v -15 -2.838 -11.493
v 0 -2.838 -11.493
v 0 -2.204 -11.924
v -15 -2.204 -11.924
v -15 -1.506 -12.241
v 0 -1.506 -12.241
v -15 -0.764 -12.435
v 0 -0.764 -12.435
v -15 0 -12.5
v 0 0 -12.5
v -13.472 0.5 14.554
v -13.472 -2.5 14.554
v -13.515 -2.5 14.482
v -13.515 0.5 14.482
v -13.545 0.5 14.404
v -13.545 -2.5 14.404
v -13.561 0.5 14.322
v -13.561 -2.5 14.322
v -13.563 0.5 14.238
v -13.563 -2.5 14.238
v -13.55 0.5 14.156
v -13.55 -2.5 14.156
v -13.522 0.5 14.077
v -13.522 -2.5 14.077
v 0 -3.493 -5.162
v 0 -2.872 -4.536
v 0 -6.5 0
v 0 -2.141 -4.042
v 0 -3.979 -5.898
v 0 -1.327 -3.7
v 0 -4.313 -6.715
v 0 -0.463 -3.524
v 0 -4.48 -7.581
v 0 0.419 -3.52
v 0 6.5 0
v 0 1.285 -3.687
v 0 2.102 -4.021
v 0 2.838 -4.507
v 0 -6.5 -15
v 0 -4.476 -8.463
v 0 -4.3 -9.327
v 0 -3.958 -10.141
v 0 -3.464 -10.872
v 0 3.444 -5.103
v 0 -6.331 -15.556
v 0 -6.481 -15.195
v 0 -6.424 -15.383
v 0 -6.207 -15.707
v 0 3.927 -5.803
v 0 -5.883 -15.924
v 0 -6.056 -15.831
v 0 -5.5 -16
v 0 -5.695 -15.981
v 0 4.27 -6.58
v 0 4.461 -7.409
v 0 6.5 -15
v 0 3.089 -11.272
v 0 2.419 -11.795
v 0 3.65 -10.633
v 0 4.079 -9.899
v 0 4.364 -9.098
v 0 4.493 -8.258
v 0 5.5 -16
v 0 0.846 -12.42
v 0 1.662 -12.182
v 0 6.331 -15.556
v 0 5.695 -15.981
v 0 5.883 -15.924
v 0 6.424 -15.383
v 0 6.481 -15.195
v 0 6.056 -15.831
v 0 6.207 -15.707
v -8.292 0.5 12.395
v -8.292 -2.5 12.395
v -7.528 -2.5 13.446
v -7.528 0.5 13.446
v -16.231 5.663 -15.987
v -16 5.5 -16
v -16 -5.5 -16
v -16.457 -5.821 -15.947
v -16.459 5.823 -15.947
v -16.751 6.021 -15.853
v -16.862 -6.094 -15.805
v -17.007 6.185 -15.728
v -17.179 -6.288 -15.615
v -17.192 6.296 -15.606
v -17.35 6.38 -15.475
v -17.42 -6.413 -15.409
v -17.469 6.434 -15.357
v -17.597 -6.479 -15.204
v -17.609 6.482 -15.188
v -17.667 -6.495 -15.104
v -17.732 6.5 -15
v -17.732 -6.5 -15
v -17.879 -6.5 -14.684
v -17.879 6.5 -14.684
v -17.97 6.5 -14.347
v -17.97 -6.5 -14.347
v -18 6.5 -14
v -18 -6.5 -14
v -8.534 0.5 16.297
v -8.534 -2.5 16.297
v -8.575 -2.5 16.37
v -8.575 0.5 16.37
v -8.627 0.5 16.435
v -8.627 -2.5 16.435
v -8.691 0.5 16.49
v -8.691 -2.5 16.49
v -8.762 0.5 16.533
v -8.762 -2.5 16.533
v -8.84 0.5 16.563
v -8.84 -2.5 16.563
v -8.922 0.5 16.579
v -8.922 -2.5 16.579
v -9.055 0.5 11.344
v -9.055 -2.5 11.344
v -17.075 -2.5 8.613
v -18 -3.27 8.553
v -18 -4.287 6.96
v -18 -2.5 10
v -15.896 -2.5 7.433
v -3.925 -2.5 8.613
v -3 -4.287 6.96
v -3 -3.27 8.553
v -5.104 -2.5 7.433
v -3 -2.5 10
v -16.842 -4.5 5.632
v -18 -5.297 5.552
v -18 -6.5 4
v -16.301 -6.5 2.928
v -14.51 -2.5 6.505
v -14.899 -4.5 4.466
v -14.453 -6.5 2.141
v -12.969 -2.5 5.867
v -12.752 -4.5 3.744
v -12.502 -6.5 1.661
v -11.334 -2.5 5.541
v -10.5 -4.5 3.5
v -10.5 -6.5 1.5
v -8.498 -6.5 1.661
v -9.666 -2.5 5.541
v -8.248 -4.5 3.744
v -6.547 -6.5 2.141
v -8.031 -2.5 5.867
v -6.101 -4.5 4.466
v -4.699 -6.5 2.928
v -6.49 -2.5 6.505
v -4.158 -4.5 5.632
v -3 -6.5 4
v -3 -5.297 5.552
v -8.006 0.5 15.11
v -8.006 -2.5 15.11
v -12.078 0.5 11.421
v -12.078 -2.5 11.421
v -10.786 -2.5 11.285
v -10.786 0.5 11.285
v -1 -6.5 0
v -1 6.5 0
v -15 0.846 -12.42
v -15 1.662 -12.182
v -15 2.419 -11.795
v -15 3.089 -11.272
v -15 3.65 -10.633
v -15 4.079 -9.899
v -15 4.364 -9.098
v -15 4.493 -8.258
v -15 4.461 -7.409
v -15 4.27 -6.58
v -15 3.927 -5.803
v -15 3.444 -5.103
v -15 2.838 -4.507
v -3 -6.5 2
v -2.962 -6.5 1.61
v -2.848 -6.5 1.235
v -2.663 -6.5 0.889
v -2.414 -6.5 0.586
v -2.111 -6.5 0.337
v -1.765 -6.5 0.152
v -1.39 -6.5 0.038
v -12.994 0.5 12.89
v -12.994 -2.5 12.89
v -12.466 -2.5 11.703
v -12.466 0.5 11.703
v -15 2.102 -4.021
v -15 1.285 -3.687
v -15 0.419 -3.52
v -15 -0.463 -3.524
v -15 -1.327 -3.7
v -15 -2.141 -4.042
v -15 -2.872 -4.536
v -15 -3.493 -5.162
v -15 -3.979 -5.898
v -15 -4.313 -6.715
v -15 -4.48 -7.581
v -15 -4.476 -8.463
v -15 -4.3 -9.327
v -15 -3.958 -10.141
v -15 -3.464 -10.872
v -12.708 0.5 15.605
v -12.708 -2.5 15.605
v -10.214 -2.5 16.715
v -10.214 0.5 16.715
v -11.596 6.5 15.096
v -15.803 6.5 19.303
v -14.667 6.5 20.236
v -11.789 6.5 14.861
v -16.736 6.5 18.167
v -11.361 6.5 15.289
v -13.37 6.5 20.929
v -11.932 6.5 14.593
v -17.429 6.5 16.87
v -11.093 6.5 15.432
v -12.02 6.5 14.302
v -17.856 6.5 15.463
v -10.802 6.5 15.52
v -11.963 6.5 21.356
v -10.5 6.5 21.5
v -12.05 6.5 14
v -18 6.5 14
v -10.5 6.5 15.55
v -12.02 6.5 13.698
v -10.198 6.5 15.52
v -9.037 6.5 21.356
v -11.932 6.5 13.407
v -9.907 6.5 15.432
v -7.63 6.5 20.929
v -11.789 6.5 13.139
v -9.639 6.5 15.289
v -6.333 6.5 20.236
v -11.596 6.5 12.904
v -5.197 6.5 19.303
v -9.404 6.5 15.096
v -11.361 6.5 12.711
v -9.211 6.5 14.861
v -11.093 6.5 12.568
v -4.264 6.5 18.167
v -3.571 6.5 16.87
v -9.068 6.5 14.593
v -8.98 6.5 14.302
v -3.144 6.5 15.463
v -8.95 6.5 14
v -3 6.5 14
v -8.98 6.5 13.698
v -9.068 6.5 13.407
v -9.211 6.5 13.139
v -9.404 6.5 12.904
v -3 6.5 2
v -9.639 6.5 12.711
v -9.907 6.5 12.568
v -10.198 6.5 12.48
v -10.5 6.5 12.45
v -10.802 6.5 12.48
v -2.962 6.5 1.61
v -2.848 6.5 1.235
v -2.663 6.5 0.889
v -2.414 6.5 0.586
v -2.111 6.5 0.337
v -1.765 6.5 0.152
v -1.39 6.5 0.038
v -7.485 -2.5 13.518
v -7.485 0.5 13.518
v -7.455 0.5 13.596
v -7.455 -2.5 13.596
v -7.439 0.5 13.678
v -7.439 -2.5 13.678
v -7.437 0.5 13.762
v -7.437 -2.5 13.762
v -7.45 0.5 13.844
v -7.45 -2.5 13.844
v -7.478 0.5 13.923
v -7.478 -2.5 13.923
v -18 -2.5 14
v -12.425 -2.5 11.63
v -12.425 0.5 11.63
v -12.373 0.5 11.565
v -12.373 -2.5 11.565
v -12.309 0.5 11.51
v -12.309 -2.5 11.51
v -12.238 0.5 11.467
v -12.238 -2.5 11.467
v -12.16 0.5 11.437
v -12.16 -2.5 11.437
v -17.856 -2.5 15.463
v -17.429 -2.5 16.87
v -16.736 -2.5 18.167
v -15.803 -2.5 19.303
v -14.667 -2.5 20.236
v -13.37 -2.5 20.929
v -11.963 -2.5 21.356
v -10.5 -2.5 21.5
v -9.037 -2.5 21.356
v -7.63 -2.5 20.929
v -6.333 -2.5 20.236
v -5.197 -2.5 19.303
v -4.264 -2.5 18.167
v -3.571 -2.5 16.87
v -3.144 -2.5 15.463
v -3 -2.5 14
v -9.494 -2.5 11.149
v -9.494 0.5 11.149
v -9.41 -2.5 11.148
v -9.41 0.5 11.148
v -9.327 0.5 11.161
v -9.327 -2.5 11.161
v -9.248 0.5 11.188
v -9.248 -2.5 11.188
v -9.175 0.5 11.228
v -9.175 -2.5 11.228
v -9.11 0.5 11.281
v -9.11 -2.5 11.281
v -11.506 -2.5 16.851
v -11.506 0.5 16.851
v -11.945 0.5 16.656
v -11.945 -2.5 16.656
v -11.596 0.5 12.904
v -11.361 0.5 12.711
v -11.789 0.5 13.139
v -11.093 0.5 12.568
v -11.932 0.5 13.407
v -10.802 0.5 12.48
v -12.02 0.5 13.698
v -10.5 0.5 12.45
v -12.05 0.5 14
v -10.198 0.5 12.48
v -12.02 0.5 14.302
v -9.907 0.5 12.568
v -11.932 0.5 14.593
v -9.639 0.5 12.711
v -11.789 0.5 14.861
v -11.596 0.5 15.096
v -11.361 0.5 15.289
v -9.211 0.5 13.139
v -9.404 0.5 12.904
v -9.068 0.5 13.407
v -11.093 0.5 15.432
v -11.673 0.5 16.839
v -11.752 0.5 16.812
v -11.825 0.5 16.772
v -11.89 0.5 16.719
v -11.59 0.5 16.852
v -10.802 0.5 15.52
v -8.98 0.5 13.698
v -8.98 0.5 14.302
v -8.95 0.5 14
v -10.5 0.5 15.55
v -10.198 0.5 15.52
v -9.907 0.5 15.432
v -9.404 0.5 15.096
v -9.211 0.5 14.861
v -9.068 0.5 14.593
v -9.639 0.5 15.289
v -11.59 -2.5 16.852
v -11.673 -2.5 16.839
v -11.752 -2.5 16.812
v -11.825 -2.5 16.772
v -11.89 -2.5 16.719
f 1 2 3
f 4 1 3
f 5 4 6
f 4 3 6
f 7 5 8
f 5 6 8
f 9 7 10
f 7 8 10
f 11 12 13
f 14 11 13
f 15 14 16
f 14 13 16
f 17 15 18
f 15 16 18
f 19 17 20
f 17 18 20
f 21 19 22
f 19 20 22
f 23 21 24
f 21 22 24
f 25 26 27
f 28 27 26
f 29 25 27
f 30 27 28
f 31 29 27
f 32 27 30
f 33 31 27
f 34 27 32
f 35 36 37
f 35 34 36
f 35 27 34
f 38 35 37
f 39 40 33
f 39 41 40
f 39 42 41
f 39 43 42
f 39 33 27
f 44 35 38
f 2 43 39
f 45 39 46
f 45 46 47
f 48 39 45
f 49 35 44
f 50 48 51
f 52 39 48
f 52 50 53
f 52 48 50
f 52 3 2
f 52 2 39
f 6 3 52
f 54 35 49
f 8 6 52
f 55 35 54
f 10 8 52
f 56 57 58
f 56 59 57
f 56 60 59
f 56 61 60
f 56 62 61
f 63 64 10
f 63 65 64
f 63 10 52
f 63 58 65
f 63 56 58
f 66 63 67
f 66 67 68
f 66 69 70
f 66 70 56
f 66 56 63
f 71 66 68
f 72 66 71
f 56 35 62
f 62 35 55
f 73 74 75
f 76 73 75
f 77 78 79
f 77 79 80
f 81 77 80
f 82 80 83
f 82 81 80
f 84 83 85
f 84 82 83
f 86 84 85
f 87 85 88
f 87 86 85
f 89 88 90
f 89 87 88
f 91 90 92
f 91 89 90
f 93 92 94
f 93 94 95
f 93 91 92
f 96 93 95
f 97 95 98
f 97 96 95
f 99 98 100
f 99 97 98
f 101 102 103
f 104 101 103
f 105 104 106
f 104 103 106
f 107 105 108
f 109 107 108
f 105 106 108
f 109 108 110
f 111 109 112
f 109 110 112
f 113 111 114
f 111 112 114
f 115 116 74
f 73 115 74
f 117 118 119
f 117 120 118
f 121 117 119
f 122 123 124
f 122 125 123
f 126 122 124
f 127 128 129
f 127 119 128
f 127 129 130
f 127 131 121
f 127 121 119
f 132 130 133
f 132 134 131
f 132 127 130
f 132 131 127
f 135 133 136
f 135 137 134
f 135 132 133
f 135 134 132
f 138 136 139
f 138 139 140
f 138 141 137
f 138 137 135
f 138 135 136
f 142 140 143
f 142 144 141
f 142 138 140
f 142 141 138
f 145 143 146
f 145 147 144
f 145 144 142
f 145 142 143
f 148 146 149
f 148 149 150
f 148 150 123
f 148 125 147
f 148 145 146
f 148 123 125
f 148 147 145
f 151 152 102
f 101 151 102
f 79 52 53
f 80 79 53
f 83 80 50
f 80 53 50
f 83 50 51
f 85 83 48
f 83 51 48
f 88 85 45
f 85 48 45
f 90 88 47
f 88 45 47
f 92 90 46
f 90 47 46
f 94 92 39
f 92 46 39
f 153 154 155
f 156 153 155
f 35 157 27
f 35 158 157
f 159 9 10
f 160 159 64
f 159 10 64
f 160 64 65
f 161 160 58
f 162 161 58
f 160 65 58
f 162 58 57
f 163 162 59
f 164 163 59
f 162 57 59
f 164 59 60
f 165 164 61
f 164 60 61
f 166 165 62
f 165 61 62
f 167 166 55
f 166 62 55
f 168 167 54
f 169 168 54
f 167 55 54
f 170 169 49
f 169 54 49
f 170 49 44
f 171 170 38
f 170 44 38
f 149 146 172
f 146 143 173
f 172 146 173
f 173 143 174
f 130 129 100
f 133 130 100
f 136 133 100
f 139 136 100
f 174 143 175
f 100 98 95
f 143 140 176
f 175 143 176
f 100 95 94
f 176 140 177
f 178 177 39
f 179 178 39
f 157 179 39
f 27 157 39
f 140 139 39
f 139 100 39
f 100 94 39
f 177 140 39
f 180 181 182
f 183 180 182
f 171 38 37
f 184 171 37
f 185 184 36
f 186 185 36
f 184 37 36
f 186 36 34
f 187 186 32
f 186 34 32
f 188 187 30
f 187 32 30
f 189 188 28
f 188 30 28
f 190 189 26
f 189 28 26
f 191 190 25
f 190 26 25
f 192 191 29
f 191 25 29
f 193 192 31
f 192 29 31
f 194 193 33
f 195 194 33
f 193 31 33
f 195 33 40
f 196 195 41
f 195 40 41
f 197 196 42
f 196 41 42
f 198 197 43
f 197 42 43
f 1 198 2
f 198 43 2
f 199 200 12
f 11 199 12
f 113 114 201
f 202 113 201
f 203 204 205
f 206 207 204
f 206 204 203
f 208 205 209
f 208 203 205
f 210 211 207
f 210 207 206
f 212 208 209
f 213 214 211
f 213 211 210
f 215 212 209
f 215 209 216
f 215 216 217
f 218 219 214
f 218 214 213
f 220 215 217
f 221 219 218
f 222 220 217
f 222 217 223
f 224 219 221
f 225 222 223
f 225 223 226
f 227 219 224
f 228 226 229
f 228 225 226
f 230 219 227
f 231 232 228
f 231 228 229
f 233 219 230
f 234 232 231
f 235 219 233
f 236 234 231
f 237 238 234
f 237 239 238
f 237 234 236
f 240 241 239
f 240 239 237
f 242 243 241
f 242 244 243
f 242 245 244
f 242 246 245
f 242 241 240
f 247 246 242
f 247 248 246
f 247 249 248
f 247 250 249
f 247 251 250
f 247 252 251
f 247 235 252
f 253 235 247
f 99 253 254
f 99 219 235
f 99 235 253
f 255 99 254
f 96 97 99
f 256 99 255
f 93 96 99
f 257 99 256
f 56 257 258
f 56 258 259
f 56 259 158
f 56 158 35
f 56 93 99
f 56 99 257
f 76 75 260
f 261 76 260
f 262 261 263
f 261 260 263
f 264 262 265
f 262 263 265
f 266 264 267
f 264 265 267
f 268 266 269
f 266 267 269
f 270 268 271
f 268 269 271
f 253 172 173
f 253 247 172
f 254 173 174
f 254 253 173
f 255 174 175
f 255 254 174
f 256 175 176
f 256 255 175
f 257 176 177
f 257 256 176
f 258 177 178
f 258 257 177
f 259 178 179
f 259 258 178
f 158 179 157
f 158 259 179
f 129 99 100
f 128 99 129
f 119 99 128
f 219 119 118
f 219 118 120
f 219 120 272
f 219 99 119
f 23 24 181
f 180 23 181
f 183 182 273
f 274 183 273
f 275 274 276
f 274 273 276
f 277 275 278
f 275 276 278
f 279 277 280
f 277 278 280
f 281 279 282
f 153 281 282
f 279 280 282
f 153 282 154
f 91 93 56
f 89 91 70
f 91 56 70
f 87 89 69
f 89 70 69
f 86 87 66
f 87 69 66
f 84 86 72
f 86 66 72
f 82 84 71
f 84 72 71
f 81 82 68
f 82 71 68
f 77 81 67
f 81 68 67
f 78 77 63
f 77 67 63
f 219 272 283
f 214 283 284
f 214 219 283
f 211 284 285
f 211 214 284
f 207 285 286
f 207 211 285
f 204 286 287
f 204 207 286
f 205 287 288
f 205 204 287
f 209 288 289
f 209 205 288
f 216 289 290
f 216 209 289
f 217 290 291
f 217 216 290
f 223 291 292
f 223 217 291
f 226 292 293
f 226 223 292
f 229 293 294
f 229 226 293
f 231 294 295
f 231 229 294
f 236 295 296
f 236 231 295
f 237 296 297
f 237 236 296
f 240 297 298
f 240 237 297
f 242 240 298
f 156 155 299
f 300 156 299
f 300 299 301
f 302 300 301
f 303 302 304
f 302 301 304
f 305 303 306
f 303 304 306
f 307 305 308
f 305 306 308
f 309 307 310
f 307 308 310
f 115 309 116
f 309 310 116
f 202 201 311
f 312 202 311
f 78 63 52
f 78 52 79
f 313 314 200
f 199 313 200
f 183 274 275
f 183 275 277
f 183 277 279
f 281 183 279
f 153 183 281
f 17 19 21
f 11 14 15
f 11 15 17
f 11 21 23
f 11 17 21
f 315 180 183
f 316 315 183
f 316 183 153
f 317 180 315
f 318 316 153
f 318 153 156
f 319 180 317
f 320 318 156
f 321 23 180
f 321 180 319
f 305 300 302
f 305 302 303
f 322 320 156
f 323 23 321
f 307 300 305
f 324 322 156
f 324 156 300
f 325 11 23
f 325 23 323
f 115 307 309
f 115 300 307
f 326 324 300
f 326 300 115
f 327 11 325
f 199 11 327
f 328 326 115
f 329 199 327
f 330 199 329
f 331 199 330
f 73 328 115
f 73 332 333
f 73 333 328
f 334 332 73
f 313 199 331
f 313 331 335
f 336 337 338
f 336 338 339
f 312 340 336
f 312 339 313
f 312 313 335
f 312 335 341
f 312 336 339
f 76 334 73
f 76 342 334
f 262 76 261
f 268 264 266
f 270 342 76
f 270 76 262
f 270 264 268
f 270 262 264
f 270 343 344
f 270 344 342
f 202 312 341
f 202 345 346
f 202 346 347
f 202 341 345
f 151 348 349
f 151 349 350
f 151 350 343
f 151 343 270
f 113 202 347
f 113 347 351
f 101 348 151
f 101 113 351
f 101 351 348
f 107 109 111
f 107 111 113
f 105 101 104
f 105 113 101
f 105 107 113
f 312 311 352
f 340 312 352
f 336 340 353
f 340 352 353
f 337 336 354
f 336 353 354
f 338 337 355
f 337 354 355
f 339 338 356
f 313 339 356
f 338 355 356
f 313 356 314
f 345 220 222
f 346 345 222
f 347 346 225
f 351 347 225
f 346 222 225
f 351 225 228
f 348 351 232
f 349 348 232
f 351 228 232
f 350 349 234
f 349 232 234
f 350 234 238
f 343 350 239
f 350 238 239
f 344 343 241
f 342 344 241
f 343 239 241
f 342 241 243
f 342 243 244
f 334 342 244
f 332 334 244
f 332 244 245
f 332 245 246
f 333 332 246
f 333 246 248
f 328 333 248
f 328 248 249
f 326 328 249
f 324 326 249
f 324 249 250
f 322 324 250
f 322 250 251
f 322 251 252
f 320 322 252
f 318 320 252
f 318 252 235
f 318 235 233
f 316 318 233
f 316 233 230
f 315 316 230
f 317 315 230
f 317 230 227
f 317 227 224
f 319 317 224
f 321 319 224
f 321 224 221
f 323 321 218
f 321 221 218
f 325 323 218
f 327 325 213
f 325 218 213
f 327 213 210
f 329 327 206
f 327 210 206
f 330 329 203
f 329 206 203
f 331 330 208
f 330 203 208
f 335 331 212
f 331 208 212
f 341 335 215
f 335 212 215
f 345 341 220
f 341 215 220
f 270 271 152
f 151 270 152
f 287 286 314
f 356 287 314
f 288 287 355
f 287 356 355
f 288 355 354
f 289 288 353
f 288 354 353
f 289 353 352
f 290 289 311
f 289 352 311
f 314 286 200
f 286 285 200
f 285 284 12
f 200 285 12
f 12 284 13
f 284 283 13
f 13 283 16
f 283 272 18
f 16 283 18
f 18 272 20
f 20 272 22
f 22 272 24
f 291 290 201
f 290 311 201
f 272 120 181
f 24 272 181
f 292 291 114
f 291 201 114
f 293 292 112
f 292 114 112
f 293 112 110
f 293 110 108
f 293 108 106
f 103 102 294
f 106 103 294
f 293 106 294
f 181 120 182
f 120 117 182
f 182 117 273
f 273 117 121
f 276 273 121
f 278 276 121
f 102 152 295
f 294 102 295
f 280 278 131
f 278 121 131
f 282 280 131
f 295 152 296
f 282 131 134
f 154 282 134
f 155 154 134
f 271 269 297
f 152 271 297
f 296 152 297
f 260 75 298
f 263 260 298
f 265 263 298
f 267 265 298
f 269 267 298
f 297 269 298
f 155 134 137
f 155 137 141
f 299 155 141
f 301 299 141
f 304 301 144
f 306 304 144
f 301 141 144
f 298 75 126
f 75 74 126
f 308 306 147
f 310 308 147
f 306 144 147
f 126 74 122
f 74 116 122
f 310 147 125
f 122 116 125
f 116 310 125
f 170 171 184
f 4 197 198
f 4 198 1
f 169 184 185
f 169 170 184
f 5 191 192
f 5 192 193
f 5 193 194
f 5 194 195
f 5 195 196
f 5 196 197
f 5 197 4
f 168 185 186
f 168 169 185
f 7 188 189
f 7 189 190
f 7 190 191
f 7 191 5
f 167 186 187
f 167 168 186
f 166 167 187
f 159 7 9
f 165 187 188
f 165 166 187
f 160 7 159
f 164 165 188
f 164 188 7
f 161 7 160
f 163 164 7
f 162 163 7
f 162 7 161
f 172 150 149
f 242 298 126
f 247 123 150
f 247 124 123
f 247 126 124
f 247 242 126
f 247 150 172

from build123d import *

# Parameters (mm, degrees)
BOSS_EXTRUDE1_DEPTH = 6.5
BOSS_EXTRUDE2_START = 6.5
SKETCH1_4_R         = 7.5
SKETCH1_4_R_2       = 1.55
BOSS_EXTRUDE2_DEPTH = 9
CUT_EXTRUDE1_DEPTH  = 15
CHAMFER1_SIZE       = 5
FILLET1_R           = 1
CUT_EXTRUDE2_DEPTH  = 3


with BuildPart() as part:
    # Sketch1 → Boss-Extrude1 (new, symmetric)
    with BuildSketch(Plane(origin=(0, 0, 0), x_dir=(1, 0, 0), z_dir=(0, 1, 0))):
        with BuildLine():
            Line((-1, 0), (0, 0))
            Line((0, 0), (0, 16))
            Line((0, 16), (-16, 16))
            ThreePointArc((-16, 16), (-17.414213562, 15.414213562), (-18, 14))
            Line((-18, 14), (-18, -14))
            ThreePointArc((-18, -14), (-10.5, -6.5), (-3, -14))
            Line((-3, -14), (-3, -2))
            ThreePointArc((-3, -2), (-2.414213562, -0.585786438), (-1, 0))
        make_face()
    extrude(amount=BOSS_EXTRUDE1_DEPTH, both=True)

    # Sketch1<4> → Boss-Extrude2 (add)
    with BuildSketch(Plane(origin=(0, 0, 0), x_dir=(1, 0, 0), z_dir=(0, 1, 0)).offset(BOSS_EXTRUDE2_START)):
        with Locations((-10.5, -14)):
            Circle(SKETCH1_4_R)
        with Locations(Location((-10.5, -14, 0), (0, 0, 270))):
            Circle(SKETCH1_4_R_2, mode=Mode.SUBTRACT)
    extrude(amount=-BOSS_EXTRUDE2_DEPTH)

    # Sketch2 → Cut-Extrude1 (cut)
    with BuildSketch(Plane(origin=(0, 0, 0), x_dir=(0, 0, -1), z_dir=(1, 0, 0))):
        with BuildLine():
            ThreePointArc((12.5, 0), (9.505604778, 4.240654932), (4.507486999, 2.837666813))
            Line((4.507486999, 2.837666813), (11.492513001, -2.837666813))
            ThreePointArc((11.492513001, -2.837666813), (12.240654932, -1.505604778), (12.5, 0))
        make_face()
        with BuildLine():
            Line((11.492513001, -2.837666813), (4.507486999, 2.837666813))
            ThreePointArc((4.507486999, 2.837666813), (5.162333187, -3.492513001), (11.492513001, -2.837666813))
        make_face()
    extrude(amount=-CUT_EXTRUDE1_DEPTH, mode=Mode.SUBTRACT)

    # Chamfer1
    # the kernel refuses this chamfer: 5 mm, written as the material it takes off along each edge
    with BuildSketch(Plane(origin=(-10.5, -6.5, 14), x_dir=(-0.003141587485879666, 0, 0.9999950652018581), z_dir=(0.9999950652018581, 0, 0.003141587485879666))) as chamfer1_piece_1_section:
        Polygon((7.5 + CHAMFER1_SIZE, 0), (7.5, -CHAMFER1_SIZE), (7.5, 0), align=None)
    chamfer1_piece_1 = revolve(axis=Axis((-10.5, -6.5, 14), (0, -1, 0)), revolution_arc=359.64, mode=Mode.PRIVATE)
    chamfer1_piece_1 = split(chamfer1_piece_1, bisect_by=Plane(origin=(-3, -4.630818152, 8.578188697), z_dir=(-1, 0, 0)), keep=Keep.TOP, mode=Mode.PRIVATE)
    chamfer1_piece_1 = split(chamfer1_piece_1, bisect_by=Plane(origin=(-19.50426243, -2.5, 8.578188697), z_dir=(0, -1, 0)), keep=Keep.TOP, mode=Mode.PRIVATE)
    add(chamfer1_piece_1, mode=Mode.SUBTRACT)
    with BuildSketch(Plane(origin=(-10.5, -6.5, 14), x_dir=(-0.003141587485879666, 0, 0.9999950652018581), z_dir=(0.9999950652018581, 0, 0.003141587485879666))) as chamfer1_piece_2_section:
        Polygon((7.5 + CHAMFER1_SIZE, 0), (7.5, -CHAMFER1_SIZE), (7.5, 0), align=None)
    chamfer1_piece_2 = revolve(axis=Axis((-10.5, -6.5, 14), (0, -1, 0)), revolution_arc=359.64, mode=Mode.PRIVATE)
    chamfer1_piece_2 = split(chamfer1_piece_2, bisect_by=Plane(origin=(-3, -5.259335852, 13.999999991), z_dir=(1, 0, 0)), keep=Keep.TOP, mode=Mode.PRIVATE)
    chamfer1_piece_2 = split(chamfer1_piece_2, bisect_by=Plane(origin=(-1.451043379, -2.5, 13.999999991), z_dir=(0, -1, 0)), keep=Keep.TOP, mode=Mode.PRIVATE)
    add(chamfer1_piece_2, mode=Mode.SUBTRACT)

    # Fillet1
    # the kernel refuses this fillet: 1 mm, written as the material it takes off along each edge
    with BuildSketch(Plane(origin=(2.5, -6.5, -16), x_dir=(0, 0, 1), z_dir=(-1, 0, 0)), Plane(origin=(2.5, 6.5, -16), x_dir=(0, -1, 0), z_dir=(-1, 0, 0))) as fillet1_piece_1:
        with BuildLine():
            CenterArc((FILLET1_R, FILLET1_R), FILLET1_R, 180, 90)
            Line((0, FILLET1_R), (0, 0))
            Line((0, 0), (FILLET1_R, 0))
        make_face()
    extrude(amount=21, mode=Mode.SUBTRACT)

    # Sketch3 → Cut-Extrude2 (cut)
    with BuildSketch(Plane.XZ.offset(2.5)):
        with BuildLine():
            Line((-7.477661315, 13.923391433), (-8.005921993, 15.110168858))
            Line((-8.005921993, 15.110168858), (-8.53418267, 16.296946283))
            ThreePointArc((-8.53418267, 16.296946283), (-8.690530367, 16.49005478), (-8.922485692, 16.579117797))
            Line((-8.922485692, 16.579117797), (-10.21439543, 16.715019342))
            Line((-10.21439543, 16.715019342), (-11.506305167, 16.850920888))
            ThreePointArc((-11.506305167, 16.850920888), (-11.75171588, 16.81207406), (-11.944824377, 16.655726364))
            Line((-11.944824377, 16.655726364), (-12.708473437, 15.604850484))
            Line((-12.708473437, 15.604850484), (-13.472122497, 14.553974605))
            ThreePointArc((-13.472122497, 14.553974605), (-13.561185513, 14.32201928), (-13.522338685, 14.076608567))
            Line((-13.522338685, 14.076608567), (-12.994078007, 12.889831142))
            Line((-12.994078007, 12.889831142), (-12.46581733, 11.703053717))
            ThreePointArc((-12.46581733, 11.703053717), (-12.309469633, 11.50994522), (-12.077514308, 11.420882203))
            Line((-12.077514308, 11.420882203), (-10.78560457, 11.284980658))
            Line((-10.78560457, 11.284980658), (-9.493694833, 11.149079112))
            ThreePointArc((-9.493694833, 11.149079112), (-9.24828412, 11.18792594), (-9.055175623, 11.344273636))
            Line((-9.055175623, 11.344273636), (-8.291526563, 12.395149516))
            Line((-8.291526563, 12.395149516), (-7.527877503, 13.446025395))
            ThreePointArc((-7.527877503, 13.446025395), (-7.438814487, 13.67798072), (-7.477661315, 13.923391433))
        make_face()
    extrude(amount=-CUT_EXTRUDE2_DEPTH, mode=Mode.SUBTRACT)


solid = part.part
